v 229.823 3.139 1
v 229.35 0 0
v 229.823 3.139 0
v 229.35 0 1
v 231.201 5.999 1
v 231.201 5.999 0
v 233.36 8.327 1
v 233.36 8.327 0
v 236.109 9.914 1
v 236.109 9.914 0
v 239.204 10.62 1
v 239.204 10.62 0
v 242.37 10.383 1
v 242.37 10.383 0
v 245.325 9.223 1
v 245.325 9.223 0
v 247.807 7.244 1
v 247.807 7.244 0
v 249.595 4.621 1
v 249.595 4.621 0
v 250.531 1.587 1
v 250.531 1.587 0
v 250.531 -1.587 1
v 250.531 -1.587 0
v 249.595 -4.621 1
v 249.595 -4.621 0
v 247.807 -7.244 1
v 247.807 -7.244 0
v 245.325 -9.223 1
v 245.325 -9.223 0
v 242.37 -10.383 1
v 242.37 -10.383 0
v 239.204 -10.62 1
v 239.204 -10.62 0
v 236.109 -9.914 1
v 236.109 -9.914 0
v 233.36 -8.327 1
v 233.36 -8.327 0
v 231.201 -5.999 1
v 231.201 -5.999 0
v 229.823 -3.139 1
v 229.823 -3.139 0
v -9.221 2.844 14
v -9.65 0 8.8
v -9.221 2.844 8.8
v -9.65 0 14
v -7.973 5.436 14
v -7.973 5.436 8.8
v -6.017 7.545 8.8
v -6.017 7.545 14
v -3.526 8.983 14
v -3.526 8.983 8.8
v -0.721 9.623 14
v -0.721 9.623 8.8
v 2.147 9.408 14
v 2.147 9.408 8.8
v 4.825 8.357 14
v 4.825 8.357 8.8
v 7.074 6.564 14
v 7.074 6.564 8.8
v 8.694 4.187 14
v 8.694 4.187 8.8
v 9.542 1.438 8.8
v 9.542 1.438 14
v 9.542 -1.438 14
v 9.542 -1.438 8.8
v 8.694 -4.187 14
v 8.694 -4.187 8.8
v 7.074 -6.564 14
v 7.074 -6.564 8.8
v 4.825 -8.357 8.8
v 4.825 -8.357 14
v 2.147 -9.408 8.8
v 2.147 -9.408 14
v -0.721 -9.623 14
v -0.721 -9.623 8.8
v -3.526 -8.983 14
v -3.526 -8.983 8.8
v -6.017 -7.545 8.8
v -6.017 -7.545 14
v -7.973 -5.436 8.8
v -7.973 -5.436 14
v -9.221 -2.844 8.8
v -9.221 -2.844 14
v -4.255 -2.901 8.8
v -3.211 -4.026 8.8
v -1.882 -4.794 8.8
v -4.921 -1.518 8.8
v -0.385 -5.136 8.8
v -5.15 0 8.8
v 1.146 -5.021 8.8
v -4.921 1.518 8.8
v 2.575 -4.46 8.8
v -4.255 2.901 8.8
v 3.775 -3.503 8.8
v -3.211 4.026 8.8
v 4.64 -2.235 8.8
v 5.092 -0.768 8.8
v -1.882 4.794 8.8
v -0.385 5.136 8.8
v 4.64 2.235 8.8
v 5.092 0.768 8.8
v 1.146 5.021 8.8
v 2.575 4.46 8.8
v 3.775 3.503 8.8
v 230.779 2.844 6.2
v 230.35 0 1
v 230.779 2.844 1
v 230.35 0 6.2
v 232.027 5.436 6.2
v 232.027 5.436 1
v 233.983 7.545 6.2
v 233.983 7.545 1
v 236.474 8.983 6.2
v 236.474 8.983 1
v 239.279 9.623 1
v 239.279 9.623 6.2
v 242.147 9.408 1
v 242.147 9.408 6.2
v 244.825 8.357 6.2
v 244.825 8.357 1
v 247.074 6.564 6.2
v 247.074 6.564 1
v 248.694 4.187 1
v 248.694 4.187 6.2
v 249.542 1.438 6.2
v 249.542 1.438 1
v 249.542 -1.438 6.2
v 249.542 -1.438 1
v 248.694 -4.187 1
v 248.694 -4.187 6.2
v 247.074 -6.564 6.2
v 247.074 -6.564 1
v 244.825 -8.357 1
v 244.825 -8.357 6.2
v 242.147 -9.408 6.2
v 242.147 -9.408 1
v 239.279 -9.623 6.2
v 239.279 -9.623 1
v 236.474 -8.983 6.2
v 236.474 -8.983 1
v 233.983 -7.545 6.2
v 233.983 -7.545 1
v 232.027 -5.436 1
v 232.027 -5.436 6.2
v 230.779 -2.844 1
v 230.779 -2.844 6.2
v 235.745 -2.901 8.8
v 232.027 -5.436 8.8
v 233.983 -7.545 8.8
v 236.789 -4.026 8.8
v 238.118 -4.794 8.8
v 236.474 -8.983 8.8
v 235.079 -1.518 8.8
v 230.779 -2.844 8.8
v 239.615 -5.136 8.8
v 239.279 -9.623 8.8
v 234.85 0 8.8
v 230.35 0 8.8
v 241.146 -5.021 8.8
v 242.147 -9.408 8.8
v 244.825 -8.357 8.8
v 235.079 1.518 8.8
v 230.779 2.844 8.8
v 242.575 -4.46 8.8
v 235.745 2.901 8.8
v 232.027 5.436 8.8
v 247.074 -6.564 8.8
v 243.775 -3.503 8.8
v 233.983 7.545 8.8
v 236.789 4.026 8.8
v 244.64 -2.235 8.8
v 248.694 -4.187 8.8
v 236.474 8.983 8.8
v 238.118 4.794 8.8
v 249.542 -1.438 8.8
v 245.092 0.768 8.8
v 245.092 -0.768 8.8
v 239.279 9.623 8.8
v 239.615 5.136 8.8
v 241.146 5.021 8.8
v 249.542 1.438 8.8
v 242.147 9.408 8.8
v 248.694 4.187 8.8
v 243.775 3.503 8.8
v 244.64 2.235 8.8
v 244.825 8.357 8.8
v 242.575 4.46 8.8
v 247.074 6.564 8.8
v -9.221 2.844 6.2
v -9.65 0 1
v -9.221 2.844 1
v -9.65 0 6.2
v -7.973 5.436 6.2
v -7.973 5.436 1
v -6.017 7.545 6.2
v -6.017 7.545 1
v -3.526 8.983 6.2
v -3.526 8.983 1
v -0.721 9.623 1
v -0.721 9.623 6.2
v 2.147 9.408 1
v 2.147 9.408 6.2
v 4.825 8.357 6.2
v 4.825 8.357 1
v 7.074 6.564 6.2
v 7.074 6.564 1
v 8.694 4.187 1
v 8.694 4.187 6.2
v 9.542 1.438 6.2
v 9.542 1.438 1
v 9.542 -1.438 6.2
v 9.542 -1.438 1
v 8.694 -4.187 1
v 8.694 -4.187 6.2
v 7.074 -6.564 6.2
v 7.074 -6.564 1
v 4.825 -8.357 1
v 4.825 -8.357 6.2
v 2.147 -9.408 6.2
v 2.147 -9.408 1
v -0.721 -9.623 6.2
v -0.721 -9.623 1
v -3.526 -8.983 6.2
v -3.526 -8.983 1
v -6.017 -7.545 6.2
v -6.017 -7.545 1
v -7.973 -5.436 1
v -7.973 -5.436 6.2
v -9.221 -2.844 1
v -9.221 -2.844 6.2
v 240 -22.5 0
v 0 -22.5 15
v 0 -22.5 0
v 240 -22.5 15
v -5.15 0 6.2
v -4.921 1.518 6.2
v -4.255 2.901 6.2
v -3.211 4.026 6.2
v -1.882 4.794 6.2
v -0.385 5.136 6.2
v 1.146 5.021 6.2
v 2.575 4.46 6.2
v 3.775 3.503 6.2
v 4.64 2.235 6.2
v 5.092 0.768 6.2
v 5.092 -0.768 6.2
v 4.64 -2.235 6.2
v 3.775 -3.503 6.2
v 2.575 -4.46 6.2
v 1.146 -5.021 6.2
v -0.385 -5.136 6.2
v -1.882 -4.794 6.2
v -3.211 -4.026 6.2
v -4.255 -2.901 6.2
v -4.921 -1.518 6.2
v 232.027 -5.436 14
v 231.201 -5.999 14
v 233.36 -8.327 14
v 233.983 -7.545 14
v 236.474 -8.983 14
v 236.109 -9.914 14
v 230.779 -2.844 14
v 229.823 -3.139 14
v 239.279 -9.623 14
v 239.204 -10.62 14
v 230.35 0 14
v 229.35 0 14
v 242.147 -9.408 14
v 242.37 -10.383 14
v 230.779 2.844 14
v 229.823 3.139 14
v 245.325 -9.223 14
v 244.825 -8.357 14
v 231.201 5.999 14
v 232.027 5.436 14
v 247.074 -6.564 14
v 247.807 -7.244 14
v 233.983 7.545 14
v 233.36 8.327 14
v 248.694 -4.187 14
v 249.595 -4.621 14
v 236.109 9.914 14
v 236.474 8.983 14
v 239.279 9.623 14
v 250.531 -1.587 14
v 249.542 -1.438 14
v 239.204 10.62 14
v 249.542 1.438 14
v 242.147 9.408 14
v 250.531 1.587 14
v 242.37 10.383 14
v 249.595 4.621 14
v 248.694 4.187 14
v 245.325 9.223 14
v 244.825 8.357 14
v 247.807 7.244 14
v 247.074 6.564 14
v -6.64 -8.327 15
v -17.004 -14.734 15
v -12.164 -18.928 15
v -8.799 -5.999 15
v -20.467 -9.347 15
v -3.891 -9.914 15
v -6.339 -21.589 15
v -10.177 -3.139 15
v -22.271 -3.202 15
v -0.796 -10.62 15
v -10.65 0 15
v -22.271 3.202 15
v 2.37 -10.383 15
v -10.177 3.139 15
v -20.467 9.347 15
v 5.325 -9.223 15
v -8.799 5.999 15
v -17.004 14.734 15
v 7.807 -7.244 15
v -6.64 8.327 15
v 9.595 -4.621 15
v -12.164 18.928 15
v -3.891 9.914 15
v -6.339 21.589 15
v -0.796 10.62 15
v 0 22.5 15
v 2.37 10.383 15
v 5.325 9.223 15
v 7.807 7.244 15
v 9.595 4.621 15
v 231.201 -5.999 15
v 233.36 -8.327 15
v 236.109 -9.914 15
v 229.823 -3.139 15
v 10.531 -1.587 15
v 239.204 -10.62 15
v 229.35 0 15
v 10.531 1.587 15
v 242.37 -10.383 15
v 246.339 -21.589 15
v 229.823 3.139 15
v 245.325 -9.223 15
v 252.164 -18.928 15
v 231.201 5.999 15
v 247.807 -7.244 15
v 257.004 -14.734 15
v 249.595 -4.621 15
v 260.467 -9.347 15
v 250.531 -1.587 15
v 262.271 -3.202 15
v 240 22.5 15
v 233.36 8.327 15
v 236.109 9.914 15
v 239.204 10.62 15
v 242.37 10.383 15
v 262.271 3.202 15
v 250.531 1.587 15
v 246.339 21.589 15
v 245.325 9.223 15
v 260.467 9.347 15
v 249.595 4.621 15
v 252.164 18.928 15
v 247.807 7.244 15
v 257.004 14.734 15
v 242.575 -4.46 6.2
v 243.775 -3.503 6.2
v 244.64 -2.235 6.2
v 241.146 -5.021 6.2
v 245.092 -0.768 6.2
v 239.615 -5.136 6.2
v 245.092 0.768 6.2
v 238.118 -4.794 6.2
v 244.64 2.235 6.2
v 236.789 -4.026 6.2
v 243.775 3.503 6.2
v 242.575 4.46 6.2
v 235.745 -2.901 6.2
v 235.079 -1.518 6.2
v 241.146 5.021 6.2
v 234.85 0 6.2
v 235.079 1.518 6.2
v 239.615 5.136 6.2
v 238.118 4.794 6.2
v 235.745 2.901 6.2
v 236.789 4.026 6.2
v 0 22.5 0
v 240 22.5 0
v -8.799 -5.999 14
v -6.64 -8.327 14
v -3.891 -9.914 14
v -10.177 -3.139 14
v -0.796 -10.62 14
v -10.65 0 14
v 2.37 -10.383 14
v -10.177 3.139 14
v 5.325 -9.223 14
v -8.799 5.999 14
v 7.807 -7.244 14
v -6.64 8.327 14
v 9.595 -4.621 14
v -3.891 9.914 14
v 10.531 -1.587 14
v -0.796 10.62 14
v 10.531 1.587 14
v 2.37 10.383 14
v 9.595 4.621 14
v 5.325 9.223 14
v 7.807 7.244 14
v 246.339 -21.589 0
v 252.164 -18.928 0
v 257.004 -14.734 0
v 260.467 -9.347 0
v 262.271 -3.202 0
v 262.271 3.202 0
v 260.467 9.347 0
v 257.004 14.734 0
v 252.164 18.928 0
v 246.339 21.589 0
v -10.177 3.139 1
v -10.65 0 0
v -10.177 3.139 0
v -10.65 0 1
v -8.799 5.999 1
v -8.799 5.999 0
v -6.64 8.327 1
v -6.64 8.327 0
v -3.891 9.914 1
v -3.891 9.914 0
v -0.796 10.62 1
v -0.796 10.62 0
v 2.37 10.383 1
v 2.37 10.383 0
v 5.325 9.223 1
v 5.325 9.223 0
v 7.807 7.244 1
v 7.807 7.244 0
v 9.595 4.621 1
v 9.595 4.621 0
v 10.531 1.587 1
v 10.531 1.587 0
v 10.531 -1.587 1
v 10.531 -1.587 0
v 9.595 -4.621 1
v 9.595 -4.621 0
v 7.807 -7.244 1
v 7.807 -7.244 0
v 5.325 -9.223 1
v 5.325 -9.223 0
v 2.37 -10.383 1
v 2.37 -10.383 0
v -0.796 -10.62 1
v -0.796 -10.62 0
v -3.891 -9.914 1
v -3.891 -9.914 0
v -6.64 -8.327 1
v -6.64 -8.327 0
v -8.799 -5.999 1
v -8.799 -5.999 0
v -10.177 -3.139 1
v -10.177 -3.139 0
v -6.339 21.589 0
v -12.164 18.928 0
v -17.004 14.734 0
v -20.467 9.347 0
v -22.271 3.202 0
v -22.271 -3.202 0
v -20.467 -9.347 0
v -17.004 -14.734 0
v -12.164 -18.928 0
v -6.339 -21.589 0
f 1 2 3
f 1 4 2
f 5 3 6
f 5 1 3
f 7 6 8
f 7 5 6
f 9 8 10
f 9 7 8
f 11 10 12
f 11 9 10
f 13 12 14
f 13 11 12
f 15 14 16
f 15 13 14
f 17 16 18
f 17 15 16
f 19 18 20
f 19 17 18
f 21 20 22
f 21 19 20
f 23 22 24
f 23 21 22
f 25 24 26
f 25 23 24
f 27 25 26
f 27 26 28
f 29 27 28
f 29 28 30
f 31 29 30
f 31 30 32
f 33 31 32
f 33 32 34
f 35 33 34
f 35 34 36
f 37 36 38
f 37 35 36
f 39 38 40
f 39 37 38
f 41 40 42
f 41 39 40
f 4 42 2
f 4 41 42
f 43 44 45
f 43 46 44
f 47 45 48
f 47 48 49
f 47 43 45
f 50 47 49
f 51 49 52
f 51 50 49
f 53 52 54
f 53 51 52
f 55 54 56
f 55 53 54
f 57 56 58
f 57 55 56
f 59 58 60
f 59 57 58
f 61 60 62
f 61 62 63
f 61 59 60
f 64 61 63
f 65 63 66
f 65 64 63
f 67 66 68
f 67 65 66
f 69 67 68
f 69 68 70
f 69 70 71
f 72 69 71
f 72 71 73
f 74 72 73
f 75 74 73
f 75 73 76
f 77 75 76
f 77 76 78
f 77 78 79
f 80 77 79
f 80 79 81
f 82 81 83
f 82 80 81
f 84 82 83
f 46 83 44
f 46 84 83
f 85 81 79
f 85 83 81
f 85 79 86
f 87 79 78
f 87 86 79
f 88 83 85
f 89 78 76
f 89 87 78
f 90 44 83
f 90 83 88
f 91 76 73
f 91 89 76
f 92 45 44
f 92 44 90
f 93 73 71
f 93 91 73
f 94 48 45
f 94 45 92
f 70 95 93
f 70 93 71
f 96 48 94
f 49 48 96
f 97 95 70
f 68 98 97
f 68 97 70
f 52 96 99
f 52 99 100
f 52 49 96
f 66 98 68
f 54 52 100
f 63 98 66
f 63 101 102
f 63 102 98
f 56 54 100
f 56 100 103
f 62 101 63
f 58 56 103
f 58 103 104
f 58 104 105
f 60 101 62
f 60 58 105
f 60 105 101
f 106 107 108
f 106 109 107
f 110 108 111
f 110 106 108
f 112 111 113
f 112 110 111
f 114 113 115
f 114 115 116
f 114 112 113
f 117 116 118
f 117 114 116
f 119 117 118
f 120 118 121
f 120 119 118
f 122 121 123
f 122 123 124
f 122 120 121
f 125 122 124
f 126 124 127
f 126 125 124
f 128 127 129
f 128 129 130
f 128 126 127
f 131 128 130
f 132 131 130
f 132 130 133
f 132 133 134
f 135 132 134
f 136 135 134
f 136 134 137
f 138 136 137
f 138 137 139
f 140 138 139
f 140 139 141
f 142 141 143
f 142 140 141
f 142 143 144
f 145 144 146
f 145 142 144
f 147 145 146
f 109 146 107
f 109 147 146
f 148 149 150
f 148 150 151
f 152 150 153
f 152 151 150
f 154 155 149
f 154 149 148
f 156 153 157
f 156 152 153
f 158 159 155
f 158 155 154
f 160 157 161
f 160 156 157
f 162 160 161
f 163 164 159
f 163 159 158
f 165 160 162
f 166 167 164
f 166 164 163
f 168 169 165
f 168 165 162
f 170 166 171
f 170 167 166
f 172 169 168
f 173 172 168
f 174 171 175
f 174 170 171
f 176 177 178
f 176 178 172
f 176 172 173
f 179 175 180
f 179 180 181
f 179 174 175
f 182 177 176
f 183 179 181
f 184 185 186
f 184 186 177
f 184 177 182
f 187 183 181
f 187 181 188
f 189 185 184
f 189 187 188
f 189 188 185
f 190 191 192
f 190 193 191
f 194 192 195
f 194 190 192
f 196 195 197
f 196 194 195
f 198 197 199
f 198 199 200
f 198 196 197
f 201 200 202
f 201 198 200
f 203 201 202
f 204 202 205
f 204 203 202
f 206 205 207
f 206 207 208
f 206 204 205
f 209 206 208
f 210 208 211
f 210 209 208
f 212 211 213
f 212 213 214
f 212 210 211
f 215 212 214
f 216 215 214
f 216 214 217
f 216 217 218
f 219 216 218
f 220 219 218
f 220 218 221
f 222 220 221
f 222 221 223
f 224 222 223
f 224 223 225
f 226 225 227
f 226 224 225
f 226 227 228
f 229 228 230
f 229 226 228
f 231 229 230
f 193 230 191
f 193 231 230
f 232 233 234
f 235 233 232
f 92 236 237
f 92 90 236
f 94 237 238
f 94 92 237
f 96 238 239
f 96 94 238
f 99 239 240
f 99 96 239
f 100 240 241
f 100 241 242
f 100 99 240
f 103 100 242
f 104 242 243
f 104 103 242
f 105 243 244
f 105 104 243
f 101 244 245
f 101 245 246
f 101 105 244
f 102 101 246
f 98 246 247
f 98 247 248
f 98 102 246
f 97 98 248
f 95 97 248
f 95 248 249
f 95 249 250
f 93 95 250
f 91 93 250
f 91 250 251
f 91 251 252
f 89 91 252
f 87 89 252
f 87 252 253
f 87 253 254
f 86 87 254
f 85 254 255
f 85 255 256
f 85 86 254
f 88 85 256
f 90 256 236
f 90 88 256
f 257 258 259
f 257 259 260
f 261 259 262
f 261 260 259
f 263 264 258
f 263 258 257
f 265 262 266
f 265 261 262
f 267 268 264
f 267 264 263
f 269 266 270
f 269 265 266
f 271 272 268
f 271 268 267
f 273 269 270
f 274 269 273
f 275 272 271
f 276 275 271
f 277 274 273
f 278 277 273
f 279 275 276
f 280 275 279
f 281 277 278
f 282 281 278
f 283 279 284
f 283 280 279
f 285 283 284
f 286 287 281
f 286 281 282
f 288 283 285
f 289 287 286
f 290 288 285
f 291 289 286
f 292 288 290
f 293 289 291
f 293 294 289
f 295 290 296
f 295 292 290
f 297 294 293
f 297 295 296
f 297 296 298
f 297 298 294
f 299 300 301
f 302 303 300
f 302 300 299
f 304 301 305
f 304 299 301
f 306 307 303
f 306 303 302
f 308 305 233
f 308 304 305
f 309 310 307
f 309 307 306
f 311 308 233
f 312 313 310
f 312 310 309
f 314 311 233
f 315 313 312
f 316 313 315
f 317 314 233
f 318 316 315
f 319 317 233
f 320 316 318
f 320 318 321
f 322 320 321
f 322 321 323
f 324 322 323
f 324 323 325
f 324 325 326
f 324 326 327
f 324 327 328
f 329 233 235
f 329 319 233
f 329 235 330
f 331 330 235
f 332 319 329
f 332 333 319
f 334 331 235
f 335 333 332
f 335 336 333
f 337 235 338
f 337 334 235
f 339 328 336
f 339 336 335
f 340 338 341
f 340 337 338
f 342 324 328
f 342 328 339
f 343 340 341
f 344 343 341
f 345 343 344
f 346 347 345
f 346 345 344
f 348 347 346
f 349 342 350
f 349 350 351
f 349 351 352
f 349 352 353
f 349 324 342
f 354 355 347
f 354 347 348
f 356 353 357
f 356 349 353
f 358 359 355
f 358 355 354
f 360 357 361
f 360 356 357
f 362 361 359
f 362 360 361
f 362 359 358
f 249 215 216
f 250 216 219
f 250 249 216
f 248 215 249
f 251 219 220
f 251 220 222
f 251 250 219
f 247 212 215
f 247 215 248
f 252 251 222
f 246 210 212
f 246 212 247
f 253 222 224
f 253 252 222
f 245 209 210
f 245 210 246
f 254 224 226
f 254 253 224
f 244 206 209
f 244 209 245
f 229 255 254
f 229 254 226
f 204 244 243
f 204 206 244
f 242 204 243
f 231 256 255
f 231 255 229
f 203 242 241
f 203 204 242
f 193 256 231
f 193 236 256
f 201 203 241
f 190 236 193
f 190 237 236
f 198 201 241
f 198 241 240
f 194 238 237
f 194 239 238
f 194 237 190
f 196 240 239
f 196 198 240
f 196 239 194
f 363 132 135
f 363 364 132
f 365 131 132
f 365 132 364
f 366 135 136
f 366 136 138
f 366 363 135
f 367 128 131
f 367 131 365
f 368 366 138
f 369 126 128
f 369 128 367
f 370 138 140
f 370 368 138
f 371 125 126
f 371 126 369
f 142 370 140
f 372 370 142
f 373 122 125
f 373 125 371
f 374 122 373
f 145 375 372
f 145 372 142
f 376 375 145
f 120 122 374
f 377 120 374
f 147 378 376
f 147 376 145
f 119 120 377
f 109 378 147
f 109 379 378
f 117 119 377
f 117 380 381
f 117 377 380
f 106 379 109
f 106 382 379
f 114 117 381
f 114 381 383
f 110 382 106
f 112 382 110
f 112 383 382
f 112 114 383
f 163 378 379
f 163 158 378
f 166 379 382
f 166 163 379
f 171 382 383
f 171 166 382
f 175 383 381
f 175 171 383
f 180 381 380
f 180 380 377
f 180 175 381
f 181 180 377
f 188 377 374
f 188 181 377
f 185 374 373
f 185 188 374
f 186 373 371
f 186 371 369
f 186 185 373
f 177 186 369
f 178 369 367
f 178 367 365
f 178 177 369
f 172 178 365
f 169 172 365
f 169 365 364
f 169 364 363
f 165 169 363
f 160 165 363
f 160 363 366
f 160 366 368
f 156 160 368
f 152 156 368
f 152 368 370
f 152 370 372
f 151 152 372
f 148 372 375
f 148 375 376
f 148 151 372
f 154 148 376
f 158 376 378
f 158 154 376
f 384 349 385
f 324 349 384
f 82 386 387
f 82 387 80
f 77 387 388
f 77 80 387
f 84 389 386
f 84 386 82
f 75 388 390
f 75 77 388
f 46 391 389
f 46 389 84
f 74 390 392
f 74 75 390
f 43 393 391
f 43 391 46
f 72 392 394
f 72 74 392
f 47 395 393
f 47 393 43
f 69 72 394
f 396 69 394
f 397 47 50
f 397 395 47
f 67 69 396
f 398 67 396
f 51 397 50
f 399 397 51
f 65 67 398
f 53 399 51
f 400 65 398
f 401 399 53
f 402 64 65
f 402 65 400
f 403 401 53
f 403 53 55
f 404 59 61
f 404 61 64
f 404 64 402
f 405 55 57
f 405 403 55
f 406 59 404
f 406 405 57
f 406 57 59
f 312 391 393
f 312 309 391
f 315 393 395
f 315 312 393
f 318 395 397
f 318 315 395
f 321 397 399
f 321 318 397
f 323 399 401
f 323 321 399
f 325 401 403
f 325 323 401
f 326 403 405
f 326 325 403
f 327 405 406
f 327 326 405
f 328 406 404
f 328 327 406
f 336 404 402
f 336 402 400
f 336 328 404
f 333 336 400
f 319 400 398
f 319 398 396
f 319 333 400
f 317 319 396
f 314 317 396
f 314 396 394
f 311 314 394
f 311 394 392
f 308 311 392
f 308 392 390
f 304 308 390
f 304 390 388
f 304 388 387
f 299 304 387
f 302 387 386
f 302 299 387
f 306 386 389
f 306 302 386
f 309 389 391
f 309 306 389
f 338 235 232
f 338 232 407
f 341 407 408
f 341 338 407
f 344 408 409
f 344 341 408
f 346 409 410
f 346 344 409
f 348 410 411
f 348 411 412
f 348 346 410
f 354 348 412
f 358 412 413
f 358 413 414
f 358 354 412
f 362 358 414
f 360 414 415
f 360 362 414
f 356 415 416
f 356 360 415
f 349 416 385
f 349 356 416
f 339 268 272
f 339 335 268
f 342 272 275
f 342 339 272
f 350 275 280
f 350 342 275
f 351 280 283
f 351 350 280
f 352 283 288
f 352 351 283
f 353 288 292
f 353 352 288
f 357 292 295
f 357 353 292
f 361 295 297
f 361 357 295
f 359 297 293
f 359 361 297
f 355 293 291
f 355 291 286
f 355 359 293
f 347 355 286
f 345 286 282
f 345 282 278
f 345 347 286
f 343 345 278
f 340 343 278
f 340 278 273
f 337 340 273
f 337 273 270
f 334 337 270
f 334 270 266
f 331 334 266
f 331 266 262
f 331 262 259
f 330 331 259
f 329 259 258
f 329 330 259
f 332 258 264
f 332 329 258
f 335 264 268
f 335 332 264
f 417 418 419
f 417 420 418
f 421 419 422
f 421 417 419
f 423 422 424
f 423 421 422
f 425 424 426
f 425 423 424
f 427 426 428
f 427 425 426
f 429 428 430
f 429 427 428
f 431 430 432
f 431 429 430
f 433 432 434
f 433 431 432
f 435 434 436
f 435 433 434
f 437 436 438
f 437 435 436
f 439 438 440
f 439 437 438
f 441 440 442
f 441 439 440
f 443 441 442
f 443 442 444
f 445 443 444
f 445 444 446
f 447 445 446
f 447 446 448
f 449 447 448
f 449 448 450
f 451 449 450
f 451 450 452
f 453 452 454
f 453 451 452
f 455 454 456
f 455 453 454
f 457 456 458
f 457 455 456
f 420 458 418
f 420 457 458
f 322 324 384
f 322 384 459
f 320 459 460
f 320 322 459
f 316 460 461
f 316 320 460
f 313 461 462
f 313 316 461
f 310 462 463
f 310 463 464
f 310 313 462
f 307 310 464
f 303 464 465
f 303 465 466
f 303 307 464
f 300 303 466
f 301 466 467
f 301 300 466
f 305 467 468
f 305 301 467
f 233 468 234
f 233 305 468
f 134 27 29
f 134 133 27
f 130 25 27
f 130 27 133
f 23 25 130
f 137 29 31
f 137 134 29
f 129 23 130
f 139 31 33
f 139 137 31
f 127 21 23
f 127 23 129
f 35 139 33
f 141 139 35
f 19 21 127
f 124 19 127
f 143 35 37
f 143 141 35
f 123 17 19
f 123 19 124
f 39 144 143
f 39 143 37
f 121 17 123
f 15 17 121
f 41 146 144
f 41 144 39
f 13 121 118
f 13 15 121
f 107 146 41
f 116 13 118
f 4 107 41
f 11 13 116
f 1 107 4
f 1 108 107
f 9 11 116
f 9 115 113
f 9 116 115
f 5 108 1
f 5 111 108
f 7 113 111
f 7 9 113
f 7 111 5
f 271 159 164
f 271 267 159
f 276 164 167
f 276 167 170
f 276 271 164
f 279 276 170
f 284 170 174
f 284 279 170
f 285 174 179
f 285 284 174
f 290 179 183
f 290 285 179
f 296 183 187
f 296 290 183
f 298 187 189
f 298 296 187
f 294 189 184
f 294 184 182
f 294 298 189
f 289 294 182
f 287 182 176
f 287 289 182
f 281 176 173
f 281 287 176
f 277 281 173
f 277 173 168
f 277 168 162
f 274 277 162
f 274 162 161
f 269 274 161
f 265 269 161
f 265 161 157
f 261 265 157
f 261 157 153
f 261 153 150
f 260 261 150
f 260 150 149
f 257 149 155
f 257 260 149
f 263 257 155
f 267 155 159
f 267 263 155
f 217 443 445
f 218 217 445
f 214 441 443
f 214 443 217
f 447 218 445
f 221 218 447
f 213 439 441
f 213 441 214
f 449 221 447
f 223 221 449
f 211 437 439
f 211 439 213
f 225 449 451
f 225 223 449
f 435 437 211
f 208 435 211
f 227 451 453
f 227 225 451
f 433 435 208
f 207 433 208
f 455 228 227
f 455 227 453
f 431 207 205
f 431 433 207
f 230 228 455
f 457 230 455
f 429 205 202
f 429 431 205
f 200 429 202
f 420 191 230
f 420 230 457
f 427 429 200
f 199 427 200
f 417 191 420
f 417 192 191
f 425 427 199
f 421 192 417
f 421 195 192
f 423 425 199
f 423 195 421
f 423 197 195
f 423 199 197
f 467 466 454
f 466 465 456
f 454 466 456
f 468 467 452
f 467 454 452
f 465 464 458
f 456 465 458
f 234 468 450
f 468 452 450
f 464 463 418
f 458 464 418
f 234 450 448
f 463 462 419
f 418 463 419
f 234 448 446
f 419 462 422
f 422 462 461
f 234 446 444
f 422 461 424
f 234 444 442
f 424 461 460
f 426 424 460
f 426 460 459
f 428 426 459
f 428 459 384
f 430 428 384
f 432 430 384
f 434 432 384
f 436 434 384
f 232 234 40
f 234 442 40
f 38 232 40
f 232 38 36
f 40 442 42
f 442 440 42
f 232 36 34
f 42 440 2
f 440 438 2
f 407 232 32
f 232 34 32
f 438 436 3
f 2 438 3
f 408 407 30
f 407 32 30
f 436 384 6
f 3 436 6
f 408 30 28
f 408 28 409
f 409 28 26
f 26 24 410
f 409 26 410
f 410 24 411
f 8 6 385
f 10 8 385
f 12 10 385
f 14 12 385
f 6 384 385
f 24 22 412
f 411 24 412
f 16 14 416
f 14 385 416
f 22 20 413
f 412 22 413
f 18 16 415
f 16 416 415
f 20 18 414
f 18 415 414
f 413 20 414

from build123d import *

# Parameters (mm, degrees)
EXTRUDE_1_DEPTH = 15


with BuildPart() as part:
    # 草图2 → 凸台-拉伸1 (new body)
    with BuildSketch(Plane.XY.offset(15)):
        with BuildLine():
            Line((0, -22.5), (240, -22.5))
            ThreePointArc((240, -22.5), (262.5, 0), (240, 22.5))
            Line((240, 22.5), (0, 22.5))
            ThreePointArc((0, 22.5), (-22.5, 0), (0, -22.5))
        make_face()
    extrude(amount=-EXTRUDE_1_DEPTH)

    # 草图3 → 切除-旋转1 (revolve, cut)
    with BuildSketch(Plane.XZ, mode=Mode.PRIVATE) as cut_revolve_1_sk:
        Polygon((250.65, 15), (240, 15), (240, 0), (250.65, 0), (250.65, 1), (249.65, 1), (249.65, 6.2), (245.15, 6.2), (245.15, 8.8), (249.65, 8.8), (249.65, 14), (250.65, 14), align=None)
    revolve(cut_revolve_1_sk.sketch.rotate(Axis((240, 0, 15), (0, 0, -1)), 180), axis=Axis((240, 0, 15), (0, 0, -1)), mode=Mode.SUBTRACT)

    # 草图4 → 切除-旋转2 (revolve, cut)
    with BuildSketch(Plane.XZ, mode=Mode.PRIVATE) as cut_revolve_2_sk:
        Polygon((10.65, 15), (0, 15), (0, 0), (10.65, 0), (10.65, 1), (9.65, 1), (9.65, 6.2), (5.15, 6.2), (5.15, 8.8), (9.65, 8.8), (9.65, 14), (10.65, 14), align=None)
    revolve(cut_revolve_2_sk.sketch.rotate(Axis((0, 0, 15), (0, 0, -1)), 180), axis=Axis((0, 0, 15), (0, 0, -1)), mode=Mode.SUBTRACT)


solid = part.part
